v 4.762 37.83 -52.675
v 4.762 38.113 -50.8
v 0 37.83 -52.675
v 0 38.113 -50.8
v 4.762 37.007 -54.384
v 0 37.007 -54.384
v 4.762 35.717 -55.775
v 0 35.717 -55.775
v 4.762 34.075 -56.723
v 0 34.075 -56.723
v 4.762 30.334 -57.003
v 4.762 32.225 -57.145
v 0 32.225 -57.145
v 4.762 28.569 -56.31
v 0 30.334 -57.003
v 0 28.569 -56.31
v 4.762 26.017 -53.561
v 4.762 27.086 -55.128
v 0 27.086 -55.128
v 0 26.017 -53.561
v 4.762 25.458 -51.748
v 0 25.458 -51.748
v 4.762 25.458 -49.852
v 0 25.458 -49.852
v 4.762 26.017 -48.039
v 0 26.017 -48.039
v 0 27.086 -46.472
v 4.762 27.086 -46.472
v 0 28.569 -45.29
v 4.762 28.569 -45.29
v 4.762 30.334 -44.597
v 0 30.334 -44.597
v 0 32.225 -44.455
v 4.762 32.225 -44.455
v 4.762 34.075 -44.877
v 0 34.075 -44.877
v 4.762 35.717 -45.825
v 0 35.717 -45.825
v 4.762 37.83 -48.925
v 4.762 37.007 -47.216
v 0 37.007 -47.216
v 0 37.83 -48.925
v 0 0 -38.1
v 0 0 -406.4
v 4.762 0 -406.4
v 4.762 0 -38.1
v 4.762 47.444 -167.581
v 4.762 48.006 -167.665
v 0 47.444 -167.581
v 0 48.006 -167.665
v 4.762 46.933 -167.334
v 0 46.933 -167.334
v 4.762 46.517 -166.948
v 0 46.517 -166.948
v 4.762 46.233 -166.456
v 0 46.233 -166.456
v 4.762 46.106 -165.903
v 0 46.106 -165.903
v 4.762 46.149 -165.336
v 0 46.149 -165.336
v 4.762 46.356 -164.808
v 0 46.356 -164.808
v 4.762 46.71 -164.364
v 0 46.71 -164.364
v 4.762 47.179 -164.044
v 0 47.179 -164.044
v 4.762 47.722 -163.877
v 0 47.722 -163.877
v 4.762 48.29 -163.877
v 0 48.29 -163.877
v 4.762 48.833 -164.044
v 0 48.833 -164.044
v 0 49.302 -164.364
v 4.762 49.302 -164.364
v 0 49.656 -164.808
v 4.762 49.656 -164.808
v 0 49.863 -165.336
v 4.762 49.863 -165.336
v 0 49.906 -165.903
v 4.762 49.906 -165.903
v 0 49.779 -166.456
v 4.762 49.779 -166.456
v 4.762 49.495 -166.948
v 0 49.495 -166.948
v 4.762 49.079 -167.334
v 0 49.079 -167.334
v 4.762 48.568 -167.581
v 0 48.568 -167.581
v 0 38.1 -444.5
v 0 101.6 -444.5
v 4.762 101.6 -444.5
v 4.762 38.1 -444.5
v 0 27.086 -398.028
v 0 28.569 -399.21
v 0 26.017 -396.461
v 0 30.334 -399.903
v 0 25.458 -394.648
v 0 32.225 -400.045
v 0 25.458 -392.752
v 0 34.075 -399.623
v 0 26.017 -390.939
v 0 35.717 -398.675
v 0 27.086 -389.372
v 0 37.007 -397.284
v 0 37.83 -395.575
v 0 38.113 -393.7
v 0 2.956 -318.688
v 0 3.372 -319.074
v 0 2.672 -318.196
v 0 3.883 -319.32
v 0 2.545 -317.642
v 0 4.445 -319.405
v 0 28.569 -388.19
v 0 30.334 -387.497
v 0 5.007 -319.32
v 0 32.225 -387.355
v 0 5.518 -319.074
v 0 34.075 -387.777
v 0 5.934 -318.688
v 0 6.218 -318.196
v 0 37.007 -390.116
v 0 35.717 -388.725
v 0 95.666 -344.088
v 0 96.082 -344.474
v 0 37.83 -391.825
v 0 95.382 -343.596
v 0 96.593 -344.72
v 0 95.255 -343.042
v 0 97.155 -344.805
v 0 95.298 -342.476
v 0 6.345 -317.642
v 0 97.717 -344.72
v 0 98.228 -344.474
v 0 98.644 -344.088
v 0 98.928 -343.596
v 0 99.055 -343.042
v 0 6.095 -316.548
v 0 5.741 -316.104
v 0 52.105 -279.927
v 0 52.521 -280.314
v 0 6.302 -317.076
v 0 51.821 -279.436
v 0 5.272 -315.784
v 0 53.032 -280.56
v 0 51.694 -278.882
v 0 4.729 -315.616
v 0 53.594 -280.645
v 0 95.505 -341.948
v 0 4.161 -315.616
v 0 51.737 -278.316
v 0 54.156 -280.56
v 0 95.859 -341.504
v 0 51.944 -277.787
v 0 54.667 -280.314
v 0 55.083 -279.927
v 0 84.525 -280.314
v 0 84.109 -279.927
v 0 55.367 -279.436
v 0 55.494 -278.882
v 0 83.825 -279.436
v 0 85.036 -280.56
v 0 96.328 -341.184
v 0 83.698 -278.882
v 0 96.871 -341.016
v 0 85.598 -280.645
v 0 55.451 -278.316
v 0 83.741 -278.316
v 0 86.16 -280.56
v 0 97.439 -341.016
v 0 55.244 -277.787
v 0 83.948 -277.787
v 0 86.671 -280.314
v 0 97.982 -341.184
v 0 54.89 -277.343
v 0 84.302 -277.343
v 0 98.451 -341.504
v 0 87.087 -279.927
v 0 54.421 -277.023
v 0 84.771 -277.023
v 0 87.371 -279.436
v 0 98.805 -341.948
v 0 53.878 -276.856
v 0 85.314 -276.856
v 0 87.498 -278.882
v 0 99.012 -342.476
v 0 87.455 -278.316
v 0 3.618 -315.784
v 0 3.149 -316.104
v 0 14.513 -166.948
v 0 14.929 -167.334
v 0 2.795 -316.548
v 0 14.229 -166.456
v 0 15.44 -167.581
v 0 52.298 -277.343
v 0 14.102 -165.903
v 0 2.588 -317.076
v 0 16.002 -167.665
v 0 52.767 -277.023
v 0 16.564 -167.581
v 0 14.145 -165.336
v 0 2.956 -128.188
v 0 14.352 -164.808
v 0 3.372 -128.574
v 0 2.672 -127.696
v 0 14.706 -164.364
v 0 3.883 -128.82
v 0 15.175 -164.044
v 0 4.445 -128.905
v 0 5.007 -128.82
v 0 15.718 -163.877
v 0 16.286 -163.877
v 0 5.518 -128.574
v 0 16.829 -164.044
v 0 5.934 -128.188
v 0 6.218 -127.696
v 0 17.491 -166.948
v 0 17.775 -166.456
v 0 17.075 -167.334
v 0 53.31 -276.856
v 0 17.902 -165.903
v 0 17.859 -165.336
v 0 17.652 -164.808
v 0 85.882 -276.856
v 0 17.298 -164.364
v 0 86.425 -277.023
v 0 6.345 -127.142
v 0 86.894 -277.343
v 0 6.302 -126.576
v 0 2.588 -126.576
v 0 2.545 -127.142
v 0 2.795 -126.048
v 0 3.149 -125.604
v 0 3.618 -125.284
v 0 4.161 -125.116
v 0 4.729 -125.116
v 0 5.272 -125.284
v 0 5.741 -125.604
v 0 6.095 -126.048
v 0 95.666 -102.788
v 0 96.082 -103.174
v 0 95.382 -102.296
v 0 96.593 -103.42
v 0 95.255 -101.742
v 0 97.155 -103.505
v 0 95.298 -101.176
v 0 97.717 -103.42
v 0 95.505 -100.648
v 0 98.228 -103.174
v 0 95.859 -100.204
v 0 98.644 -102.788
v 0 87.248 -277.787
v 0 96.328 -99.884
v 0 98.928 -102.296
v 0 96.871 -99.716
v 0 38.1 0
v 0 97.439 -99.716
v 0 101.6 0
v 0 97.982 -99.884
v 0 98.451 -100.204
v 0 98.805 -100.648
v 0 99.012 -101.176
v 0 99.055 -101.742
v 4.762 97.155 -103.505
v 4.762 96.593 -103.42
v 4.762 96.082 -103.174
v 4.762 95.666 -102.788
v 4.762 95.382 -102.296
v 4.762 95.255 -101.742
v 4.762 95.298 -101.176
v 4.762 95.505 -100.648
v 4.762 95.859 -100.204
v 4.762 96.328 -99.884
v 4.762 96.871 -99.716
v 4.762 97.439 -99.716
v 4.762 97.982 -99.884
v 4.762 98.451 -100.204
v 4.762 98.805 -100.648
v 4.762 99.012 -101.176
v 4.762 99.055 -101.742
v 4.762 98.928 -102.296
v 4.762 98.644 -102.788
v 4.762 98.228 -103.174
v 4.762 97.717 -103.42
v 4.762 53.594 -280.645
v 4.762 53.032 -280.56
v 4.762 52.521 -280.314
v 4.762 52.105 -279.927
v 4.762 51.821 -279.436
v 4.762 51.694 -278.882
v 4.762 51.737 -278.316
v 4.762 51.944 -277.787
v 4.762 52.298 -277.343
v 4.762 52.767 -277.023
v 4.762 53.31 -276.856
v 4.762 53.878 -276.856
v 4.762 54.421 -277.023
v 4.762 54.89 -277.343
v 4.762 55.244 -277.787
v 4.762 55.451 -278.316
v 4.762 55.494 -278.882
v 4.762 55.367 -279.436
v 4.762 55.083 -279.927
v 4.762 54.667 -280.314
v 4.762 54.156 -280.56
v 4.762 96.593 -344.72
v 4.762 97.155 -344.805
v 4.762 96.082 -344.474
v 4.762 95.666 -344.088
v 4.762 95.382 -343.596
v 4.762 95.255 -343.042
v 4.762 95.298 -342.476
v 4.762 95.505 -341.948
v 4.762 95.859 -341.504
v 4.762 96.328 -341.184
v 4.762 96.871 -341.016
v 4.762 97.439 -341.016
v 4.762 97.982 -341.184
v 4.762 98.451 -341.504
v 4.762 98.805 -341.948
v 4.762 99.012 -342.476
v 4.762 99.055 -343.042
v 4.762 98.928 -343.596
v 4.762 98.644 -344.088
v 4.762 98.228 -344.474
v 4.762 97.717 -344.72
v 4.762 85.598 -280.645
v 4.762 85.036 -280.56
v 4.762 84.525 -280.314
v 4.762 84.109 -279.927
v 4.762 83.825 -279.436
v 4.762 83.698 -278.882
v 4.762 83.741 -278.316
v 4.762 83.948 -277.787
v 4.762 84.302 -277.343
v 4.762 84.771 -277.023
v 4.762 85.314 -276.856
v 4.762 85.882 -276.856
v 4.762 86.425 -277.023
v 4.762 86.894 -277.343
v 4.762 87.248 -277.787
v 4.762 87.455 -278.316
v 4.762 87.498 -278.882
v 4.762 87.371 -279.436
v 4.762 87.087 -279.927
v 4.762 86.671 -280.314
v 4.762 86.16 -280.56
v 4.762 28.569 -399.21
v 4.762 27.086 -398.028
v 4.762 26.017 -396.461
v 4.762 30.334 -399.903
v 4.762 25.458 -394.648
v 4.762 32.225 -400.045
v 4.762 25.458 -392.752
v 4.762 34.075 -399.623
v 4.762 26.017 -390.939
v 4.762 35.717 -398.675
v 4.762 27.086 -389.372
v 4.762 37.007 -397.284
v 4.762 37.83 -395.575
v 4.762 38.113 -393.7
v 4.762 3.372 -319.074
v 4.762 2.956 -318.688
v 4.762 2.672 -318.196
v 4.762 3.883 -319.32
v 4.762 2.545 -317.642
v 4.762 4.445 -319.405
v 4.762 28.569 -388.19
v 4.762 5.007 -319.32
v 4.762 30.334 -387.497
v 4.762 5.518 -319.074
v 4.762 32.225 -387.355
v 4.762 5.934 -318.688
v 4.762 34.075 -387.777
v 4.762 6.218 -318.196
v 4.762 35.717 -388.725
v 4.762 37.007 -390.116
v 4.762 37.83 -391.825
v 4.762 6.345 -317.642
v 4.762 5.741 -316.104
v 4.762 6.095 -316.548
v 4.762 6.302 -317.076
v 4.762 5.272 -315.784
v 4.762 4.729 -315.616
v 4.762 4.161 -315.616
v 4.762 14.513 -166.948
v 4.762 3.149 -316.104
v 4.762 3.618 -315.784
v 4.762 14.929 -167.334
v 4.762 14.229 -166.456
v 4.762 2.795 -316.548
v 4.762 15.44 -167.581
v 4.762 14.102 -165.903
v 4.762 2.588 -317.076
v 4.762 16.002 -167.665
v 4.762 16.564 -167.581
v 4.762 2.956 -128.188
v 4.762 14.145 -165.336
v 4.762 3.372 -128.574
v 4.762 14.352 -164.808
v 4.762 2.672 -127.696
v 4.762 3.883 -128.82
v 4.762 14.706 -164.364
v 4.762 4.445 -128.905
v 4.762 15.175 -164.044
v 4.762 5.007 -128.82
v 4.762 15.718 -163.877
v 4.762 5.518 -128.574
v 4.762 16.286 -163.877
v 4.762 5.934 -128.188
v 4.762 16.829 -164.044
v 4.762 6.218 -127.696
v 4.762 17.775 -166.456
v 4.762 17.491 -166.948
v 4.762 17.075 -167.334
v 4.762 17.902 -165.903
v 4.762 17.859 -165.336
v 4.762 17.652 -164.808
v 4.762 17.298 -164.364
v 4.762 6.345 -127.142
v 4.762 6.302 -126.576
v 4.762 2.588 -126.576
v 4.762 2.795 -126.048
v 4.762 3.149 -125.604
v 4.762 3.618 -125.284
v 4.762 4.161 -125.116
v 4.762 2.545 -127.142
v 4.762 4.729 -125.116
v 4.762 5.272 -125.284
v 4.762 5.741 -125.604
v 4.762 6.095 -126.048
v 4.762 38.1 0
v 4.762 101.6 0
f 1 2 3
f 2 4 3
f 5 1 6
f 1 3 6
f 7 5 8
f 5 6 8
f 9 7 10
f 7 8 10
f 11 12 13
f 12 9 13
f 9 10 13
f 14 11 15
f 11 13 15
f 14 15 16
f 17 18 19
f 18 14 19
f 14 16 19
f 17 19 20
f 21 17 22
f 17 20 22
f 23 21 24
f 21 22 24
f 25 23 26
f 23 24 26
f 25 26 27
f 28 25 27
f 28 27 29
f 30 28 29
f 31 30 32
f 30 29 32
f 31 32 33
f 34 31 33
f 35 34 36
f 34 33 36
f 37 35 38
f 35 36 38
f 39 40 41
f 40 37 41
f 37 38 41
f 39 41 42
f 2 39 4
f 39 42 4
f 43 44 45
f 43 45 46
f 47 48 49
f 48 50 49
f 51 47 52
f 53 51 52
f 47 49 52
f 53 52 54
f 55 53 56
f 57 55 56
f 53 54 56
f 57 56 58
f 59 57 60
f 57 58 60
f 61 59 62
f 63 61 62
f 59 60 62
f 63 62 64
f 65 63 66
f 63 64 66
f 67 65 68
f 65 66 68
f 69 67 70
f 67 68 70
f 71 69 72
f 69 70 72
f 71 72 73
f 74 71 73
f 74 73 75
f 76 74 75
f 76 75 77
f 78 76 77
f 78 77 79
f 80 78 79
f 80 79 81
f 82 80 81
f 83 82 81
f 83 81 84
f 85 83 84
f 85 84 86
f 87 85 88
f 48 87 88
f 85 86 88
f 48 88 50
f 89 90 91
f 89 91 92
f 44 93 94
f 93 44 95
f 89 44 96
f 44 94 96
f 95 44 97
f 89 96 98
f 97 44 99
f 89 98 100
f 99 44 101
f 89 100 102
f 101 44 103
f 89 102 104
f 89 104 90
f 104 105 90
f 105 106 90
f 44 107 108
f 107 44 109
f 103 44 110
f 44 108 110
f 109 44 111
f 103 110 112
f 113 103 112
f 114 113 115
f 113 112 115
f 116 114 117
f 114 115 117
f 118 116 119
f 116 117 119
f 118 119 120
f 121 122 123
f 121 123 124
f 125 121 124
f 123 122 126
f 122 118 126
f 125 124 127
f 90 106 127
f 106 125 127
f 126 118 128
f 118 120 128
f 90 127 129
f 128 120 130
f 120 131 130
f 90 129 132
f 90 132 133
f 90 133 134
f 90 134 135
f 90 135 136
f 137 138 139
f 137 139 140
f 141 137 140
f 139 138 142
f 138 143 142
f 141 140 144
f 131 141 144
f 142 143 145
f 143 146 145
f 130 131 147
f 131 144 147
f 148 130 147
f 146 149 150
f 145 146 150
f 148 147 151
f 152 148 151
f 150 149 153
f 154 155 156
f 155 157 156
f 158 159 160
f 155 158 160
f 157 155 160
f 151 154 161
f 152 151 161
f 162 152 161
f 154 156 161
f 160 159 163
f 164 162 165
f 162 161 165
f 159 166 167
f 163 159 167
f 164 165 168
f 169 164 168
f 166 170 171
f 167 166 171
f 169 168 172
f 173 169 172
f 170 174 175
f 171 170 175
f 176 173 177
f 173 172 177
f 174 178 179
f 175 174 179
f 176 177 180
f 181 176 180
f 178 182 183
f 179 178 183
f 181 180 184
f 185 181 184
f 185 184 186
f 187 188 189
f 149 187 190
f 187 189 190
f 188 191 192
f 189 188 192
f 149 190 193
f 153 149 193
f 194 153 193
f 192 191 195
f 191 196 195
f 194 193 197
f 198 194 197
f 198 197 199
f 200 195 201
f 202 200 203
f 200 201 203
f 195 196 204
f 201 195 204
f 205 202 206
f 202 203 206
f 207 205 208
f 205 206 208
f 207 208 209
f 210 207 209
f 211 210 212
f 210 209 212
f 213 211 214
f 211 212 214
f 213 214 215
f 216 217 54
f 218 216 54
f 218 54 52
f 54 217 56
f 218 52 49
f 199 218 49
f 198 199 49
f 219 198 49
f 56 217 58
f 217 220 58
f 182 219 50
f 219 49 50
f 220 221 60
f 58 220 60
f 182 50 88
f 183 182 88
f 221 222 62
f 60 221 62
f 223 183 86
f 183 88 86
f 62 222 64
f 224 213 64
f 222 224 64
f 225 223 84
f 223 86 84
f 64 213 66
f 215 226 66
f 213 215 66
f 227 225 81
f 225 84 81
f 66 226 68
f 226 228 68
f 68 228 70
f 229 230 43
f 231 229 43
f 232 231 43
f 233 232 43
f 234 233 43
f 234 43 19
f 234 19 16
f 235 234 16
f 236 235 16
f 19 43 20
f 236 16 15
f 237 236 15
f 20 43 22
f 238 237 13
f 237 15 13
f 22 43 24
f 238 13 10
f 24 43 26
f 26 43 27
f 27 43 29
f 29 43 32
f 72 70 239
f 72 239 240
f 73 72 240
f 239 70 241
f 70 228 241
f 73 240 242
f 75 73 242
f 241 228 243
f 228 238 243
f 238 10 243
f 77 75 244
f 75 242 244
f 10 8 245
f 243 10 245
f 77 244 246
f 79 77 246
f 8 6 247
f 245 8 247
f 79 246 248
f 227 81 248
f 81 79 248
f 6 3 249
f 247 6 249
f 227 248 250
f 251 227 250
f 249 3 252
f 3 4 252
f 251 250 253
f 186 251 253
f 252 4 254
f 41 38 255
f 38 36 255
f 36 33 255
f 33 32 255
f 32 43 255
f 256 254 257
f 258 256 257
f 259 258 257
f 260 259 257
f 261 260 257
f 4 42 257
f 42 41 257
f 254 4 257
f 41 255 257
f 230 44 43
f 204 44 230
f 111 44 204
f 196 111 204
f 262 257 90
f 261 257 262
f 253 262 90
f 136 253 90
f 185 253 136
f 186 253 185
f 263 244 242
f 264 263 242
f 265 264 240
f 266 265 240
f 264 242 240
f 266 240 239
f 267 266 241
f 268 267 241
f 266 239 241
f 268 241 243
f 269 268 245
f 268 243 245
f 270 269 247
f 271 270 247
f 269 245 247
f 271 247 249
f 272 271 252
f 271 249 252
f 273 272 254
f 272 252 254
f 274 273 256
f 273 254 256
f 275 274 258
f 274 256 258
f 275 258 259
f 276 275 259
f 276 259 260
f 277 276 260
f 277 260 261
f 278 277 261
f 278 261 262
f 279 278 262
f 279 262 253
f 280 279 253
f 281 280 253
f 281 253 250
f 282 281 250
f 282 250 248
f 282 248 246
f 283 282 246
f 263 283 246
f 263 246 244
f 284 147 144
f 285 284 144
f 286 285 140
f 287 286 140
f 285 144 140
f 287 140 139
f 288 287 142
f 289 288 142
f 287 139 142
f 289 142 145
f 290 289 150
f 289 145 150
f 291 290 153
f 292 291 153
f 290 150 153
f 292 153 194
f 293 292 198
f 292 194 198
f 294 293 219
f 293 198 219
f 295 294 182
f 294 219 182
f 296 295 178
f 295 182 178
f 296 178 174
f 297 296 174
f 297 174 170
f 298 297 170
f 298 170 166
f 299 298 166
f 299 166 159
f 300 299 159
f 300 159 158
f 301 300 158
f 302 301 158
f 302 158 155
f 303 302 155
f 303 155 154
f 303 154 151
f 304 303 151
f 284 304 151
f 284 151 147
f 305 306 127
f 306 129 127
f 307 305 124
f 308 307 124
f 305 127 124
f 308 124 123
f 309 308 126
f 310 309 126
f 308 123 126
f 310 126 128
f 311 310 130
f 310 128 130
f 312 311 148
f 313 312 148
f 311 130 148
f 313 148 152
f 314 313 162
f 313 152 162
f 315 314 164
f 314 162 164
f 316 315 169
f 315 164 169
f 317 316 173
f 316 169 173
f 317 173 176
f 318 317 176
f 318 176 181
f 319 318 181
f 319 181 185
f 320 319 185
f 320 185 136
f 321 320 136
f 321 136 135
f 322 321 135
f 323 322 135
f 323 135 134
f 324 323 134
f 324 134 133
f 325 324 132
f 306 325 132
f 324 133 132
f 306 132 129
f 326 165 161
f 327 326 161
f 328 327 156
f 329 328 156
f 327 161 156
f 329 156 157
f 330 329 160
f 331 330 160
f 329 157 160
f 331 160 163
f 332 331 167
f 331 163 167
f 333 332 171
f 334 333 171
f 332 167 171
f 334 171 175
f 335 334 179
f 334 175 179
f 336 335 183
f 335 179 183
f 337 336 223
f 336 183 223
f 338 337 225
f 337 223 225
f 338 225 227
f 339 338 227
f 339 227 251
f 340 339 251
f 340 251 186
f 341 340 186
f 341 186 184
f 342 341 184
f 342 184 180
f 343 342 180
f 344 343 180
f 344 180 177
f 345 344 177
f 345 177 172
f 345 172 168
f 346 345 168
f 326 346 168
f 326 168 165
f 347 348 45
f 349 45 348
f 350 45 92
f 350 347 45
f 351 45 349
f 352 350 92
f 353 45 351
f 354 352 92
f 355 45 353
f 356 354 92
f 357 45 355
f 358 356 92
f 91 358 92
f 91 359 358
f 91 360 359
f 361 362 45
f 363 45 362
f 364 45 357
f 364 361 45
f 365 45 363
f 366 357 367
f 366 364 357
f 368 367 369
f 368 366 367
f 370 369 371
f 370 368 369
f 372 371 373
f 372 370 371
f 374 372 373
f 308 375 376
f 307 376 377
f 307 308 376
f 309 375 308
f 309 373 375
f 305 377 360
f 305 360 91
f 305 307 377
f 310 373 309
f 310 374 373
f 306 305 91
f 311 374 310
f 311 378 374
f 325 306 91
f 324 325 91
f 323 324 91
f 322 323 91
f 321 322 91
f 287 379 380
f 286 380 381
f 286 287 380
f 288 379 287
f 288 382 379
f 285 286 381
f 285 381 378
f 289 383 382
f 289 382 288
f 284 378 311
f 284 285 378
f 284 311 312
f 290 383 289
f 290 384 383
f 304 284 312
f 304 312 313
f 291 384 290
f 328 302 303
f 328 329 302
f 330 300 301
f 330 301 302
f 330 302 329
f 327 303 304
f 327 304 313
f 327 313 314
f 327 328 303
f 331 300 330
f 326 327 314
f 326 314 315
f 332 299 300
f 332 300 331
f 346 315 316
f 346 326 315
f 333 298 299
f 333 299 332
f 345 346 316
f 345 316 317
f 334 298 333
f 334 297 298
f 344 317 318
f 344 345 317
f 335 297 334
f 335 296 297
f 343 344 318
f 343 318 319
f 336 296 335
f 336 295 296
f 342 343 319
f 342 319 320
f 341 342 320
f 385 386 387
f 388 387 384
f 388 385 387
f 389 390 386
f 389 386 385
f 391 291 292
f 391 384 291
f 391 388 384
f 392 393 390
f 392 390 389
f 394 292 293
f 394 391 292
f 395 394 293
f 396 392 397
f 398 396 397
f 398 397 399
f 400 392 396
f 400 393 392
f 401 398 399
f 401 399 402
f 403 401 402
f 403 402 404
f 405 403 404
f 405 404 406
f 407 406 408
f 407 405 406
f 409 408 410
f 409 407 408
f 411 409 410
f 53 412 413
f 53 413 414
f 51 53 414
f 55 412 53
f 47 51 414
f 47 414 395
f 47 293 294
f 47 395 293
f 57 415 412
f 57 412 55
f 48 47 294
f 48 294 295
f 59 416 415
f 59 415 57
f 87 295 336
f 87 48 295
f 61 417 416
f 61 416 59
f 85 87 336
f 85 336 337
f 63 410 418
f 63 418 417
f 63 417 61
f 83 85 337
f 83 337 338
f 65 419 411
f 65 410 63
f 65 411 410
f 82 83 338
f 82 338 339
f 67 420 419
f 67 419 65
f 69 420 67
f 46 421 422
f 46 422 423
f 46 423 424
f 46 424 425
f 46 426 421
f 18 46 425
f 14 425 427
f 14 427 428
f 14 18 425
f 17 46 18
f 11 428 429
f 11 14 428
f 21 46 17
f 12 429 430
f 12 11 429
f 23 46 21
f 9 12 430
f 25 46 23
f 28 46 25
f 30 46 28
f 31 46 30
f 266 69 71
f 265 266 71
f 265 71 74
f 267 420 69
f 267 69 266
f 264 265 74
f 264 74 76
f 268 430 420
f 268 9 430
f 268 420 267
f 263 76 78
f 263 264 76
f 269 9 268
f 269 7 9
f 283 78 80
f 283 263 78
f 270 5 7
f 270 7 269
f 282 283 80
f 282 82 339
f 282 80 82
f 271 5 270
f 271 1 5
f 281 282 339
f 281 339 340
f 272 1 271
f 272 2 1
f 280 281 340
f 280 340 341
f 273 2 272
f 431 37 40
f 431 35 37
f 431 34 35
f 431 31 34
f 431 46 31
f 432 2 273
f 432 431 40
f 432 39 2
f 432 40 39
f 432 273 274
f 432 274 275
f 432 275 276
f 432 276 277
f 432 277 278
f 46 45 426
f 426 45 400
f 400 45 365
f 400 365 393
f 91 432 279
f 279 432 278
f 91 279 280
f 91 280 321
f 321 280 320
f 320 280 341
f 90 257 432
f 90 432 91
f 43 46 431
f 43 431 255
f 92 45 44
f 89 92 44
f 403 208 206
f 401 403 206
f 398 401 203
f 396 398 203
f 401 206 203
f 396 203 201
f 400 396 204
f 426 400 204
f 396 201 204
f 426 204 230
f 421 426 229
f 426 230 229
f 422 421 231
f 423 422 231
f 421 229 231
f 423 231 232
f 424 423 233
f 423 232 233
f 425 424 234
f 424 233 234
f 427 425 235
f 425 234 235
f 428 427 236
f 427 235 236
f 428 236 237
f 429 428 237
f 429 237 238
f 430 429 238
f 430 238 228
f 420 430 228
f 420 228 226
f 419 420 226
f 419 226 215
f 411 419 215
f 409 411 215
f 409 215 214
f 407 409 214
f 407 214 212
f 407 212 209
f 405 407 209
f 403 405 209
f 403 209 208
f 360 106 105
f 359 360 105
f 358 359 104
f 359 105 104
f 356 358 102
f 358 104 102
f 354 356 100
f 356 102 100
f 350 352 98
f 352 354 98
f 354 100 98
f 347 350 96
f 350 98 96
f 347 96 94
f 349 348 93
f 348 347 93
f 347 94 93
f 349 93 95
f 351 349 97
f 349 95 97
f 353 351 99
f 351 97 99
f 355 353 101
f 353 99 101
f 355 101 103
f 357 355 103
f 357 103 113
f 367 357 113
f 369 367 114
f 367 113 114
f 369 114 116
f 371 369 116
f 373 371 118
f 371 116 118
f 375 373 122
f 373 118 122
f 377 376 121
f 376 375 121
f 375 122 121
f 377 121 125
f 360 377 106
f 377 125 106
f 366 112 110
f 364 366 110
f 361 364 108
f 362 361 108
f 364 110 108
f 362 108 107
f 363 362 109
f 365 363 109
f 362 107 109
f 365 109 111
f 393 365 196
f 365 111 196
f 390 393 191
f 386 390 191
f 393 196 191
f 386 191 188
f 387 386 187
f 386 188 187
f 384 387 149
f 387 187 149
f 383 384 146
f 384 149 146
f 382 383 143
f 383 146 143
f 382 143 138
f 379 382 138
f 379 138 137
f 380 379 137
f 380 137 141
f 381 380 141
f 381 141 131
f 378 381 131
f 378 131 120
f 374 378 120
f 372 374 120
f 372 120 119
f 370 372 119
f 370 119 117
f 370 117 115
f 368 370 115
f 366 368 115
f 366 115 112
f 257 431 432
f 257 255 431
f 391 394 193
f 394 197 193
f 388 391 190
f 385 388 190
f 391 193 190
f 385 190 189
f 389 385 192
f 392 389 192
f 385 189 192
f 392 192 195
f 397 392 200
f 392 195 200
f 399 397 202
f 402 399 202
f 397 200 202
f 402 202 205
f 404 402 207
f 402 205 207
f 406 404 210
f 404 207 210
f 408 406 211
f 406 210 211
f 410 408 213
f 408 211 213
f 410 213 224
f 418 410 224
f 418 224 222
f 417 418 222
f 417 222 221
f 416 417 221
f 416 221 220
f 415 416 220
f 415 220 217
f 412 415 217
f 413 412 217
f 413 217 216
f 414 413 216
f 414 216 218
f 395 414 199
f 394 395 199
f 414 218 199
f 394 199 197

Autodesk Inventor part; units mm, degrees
ref_plane "YZ Plane" through (0, 0, 0) normal (1, 0, 0) x (0, 1, 0)
ref_plane "XZ Plane" through (0, 0, 0) normal (0, 1, 0) x (-1, 0, 0)
ref_plane "XY Plane" through (0, 0, 0) normal (0, 0, 1) x (1, 0, 0)
sketch "Sketch1" plane through (0, 0, 0) normal (1, 0, 0) x (0, 1, 0)
  line L0 (0, 0) -> (101.6, 0)
  line L1 (101.6, 0) -> (101.6, -444.5)
  line L2 (101.6, -444.5) -> (0, -444.5)
  line L3 (0, -444.5) -> (0, 0)
  circle A0 centre (31.75, -50.8) radius 6.3627
  circle A1 centre (31.75, -393.7) radius 6.3627
  circle A2 centre (86.2838, -165.5318) radius 1.5875
  circle A3 centre (70.2818, -165.5318) radius 1.5875
  circle A4 centre (15.3162, -278.9682) radius 1.5875
  circle A5 centre (31.3182, -278.9682) radius 1.5875
  dimension "d0" = 101.6
  dimension "d1" = 444.5
  dimension "d2" = 12.7254
  dimension "d3" = 31.75
  dimension "d4" = 50.8
  dimension "d5" = 50.8
  dimension "d22" = 165.5318
  dimension "d23" = 3.175
  dimension "d24" = 15.3162
  dimension "d25" = 3.175
  dimension "d26" = 16.002
  dimension "d27" = 165.5318
  dimension "d28" = 3.175
  dimension "d29" = 15.3162
  dimension "d30" = 165.5318
  dimension "d31" = 3.175
  dimension "d32" = 16.002
  dimension "d33" = 165.5318
extrude "Extrusion1" add sketch "Sketch1" along normal blind 4.7625 contours L0 L1 L2 L3 | A2 | A3 | A4 | A5
chamfer "Chamfer1" distance 38.1 angle 45 1 edges at (2.3813, 0, 0)
chamfer "Chamfer2" distance 38.1 angle 45 1 edges at (2.3813, 0, -444.5)
sketch "Sketch6" plane through (4.7625, 0, 0) normal (1, 0, 0) x (0, 0, -1)
  line L0 (444.5, 38.1) -> (406.4, 0) projected
  line L1 (444.5, 38.1) -> (444.5, 101.6) projected
  line L2 (444.5, 101.6) -> (0, 101.6) projected
  line L3 (0, 101.6) -> (0, 38.1) projected
  line L4 (38.1, 0) -> (0, 38.1) projected
  line L5 (38.1, 0) -> (406.4, 0) projected
  circle A0 centre (393.7, 31.75) radius 6.3627 projected
  circle A1 centre (50.8, 31.75) radius 6.3627 projected
  point P0 (0, 0)
  point P1 (165.7604, 48.006)
  point P2 (165.7604, 16.002)
  point P3 (278.7396, 85.598)
  point P4 (278.7396, 53.594)
  dimension "d80" = 32.004
  dimension "d83" = 16.002
  dimension "d86" = 32.004
  dimension "d87" = 16.002
hole "Hole1" at (4.7625, 48.006, -165.7604) at (4.7625, 16.002, -165.7604) at (4.7625, 85.598, -278.7396) at (4.7625, 53.594, -278.7396) direction (-1, 0, 0) diameter 3.81 end through all
sketch "Sketch7" plane through (4.7625, 0, 0) normal (1, 0, 0) x (0, 0, -1)
  circle A0 centre (278.7396, 85.598) radius 1.905 projected
  circle A1 centre (165.7604, 48.006) radius 1.905 projected
  circle A2 centre (165.7604, 16.002) radius 1.905 projected
  circle A3 centre (278.7396, 53.594) radius 1.905 projected
  line L0 (444.5, 38.1) -> (406.4, 0) projected
  line L1 (444.5, 38.1) -> (444.5, 101.6) projected
  line L2 (444.5, 101.6) -> (0, 101.6) projected
  line L3 (0, 101.6) -> (0, 38.1) projected
  line L4 (38.1, 0) -> (0, 38.1) projected
  line L5 (38.1, 0) -> (406.4, 0) projected
  circle A4 centre (393.7, 31.75) radius 6.3627 projected
  circle A5 centre (50.8, 31.75) radius 6.3627 projected
  point P0 (0, 0)
  point P1 (101.6, 97.155)
  point P2 (342.9, 97.155)
  point P3 (127, 4.445)
  point P4 (317.5, 4.445)
  dimension "d95" = 4.445
  dimension "d96" = 4.445
  dimension "d97" = 4.445
  dimension "d98" = 4.445
  dimension "d99" = 101.6
  dimension "d100" = 101.6
  dimension "d101" = 127
  dimension "d102" = 127
hole "Hole2" at (4.7625, 97.155, -101.6) at (4.7625, 97.155, -342.9) at (4.7625, 4.445, -127) at (4.7625, 4.445, -317.5) direction (-1, 0, 0) diameter 3.81 depth 25.4 tip angle 118
equation "\"d96\" = d95"
equation "\"d97\" = d95"
equation "\"d98\" = d95"
equation "\"d100\" = d99"
properties part number "DriveTrain3.0" material "Aluminum 6061"
